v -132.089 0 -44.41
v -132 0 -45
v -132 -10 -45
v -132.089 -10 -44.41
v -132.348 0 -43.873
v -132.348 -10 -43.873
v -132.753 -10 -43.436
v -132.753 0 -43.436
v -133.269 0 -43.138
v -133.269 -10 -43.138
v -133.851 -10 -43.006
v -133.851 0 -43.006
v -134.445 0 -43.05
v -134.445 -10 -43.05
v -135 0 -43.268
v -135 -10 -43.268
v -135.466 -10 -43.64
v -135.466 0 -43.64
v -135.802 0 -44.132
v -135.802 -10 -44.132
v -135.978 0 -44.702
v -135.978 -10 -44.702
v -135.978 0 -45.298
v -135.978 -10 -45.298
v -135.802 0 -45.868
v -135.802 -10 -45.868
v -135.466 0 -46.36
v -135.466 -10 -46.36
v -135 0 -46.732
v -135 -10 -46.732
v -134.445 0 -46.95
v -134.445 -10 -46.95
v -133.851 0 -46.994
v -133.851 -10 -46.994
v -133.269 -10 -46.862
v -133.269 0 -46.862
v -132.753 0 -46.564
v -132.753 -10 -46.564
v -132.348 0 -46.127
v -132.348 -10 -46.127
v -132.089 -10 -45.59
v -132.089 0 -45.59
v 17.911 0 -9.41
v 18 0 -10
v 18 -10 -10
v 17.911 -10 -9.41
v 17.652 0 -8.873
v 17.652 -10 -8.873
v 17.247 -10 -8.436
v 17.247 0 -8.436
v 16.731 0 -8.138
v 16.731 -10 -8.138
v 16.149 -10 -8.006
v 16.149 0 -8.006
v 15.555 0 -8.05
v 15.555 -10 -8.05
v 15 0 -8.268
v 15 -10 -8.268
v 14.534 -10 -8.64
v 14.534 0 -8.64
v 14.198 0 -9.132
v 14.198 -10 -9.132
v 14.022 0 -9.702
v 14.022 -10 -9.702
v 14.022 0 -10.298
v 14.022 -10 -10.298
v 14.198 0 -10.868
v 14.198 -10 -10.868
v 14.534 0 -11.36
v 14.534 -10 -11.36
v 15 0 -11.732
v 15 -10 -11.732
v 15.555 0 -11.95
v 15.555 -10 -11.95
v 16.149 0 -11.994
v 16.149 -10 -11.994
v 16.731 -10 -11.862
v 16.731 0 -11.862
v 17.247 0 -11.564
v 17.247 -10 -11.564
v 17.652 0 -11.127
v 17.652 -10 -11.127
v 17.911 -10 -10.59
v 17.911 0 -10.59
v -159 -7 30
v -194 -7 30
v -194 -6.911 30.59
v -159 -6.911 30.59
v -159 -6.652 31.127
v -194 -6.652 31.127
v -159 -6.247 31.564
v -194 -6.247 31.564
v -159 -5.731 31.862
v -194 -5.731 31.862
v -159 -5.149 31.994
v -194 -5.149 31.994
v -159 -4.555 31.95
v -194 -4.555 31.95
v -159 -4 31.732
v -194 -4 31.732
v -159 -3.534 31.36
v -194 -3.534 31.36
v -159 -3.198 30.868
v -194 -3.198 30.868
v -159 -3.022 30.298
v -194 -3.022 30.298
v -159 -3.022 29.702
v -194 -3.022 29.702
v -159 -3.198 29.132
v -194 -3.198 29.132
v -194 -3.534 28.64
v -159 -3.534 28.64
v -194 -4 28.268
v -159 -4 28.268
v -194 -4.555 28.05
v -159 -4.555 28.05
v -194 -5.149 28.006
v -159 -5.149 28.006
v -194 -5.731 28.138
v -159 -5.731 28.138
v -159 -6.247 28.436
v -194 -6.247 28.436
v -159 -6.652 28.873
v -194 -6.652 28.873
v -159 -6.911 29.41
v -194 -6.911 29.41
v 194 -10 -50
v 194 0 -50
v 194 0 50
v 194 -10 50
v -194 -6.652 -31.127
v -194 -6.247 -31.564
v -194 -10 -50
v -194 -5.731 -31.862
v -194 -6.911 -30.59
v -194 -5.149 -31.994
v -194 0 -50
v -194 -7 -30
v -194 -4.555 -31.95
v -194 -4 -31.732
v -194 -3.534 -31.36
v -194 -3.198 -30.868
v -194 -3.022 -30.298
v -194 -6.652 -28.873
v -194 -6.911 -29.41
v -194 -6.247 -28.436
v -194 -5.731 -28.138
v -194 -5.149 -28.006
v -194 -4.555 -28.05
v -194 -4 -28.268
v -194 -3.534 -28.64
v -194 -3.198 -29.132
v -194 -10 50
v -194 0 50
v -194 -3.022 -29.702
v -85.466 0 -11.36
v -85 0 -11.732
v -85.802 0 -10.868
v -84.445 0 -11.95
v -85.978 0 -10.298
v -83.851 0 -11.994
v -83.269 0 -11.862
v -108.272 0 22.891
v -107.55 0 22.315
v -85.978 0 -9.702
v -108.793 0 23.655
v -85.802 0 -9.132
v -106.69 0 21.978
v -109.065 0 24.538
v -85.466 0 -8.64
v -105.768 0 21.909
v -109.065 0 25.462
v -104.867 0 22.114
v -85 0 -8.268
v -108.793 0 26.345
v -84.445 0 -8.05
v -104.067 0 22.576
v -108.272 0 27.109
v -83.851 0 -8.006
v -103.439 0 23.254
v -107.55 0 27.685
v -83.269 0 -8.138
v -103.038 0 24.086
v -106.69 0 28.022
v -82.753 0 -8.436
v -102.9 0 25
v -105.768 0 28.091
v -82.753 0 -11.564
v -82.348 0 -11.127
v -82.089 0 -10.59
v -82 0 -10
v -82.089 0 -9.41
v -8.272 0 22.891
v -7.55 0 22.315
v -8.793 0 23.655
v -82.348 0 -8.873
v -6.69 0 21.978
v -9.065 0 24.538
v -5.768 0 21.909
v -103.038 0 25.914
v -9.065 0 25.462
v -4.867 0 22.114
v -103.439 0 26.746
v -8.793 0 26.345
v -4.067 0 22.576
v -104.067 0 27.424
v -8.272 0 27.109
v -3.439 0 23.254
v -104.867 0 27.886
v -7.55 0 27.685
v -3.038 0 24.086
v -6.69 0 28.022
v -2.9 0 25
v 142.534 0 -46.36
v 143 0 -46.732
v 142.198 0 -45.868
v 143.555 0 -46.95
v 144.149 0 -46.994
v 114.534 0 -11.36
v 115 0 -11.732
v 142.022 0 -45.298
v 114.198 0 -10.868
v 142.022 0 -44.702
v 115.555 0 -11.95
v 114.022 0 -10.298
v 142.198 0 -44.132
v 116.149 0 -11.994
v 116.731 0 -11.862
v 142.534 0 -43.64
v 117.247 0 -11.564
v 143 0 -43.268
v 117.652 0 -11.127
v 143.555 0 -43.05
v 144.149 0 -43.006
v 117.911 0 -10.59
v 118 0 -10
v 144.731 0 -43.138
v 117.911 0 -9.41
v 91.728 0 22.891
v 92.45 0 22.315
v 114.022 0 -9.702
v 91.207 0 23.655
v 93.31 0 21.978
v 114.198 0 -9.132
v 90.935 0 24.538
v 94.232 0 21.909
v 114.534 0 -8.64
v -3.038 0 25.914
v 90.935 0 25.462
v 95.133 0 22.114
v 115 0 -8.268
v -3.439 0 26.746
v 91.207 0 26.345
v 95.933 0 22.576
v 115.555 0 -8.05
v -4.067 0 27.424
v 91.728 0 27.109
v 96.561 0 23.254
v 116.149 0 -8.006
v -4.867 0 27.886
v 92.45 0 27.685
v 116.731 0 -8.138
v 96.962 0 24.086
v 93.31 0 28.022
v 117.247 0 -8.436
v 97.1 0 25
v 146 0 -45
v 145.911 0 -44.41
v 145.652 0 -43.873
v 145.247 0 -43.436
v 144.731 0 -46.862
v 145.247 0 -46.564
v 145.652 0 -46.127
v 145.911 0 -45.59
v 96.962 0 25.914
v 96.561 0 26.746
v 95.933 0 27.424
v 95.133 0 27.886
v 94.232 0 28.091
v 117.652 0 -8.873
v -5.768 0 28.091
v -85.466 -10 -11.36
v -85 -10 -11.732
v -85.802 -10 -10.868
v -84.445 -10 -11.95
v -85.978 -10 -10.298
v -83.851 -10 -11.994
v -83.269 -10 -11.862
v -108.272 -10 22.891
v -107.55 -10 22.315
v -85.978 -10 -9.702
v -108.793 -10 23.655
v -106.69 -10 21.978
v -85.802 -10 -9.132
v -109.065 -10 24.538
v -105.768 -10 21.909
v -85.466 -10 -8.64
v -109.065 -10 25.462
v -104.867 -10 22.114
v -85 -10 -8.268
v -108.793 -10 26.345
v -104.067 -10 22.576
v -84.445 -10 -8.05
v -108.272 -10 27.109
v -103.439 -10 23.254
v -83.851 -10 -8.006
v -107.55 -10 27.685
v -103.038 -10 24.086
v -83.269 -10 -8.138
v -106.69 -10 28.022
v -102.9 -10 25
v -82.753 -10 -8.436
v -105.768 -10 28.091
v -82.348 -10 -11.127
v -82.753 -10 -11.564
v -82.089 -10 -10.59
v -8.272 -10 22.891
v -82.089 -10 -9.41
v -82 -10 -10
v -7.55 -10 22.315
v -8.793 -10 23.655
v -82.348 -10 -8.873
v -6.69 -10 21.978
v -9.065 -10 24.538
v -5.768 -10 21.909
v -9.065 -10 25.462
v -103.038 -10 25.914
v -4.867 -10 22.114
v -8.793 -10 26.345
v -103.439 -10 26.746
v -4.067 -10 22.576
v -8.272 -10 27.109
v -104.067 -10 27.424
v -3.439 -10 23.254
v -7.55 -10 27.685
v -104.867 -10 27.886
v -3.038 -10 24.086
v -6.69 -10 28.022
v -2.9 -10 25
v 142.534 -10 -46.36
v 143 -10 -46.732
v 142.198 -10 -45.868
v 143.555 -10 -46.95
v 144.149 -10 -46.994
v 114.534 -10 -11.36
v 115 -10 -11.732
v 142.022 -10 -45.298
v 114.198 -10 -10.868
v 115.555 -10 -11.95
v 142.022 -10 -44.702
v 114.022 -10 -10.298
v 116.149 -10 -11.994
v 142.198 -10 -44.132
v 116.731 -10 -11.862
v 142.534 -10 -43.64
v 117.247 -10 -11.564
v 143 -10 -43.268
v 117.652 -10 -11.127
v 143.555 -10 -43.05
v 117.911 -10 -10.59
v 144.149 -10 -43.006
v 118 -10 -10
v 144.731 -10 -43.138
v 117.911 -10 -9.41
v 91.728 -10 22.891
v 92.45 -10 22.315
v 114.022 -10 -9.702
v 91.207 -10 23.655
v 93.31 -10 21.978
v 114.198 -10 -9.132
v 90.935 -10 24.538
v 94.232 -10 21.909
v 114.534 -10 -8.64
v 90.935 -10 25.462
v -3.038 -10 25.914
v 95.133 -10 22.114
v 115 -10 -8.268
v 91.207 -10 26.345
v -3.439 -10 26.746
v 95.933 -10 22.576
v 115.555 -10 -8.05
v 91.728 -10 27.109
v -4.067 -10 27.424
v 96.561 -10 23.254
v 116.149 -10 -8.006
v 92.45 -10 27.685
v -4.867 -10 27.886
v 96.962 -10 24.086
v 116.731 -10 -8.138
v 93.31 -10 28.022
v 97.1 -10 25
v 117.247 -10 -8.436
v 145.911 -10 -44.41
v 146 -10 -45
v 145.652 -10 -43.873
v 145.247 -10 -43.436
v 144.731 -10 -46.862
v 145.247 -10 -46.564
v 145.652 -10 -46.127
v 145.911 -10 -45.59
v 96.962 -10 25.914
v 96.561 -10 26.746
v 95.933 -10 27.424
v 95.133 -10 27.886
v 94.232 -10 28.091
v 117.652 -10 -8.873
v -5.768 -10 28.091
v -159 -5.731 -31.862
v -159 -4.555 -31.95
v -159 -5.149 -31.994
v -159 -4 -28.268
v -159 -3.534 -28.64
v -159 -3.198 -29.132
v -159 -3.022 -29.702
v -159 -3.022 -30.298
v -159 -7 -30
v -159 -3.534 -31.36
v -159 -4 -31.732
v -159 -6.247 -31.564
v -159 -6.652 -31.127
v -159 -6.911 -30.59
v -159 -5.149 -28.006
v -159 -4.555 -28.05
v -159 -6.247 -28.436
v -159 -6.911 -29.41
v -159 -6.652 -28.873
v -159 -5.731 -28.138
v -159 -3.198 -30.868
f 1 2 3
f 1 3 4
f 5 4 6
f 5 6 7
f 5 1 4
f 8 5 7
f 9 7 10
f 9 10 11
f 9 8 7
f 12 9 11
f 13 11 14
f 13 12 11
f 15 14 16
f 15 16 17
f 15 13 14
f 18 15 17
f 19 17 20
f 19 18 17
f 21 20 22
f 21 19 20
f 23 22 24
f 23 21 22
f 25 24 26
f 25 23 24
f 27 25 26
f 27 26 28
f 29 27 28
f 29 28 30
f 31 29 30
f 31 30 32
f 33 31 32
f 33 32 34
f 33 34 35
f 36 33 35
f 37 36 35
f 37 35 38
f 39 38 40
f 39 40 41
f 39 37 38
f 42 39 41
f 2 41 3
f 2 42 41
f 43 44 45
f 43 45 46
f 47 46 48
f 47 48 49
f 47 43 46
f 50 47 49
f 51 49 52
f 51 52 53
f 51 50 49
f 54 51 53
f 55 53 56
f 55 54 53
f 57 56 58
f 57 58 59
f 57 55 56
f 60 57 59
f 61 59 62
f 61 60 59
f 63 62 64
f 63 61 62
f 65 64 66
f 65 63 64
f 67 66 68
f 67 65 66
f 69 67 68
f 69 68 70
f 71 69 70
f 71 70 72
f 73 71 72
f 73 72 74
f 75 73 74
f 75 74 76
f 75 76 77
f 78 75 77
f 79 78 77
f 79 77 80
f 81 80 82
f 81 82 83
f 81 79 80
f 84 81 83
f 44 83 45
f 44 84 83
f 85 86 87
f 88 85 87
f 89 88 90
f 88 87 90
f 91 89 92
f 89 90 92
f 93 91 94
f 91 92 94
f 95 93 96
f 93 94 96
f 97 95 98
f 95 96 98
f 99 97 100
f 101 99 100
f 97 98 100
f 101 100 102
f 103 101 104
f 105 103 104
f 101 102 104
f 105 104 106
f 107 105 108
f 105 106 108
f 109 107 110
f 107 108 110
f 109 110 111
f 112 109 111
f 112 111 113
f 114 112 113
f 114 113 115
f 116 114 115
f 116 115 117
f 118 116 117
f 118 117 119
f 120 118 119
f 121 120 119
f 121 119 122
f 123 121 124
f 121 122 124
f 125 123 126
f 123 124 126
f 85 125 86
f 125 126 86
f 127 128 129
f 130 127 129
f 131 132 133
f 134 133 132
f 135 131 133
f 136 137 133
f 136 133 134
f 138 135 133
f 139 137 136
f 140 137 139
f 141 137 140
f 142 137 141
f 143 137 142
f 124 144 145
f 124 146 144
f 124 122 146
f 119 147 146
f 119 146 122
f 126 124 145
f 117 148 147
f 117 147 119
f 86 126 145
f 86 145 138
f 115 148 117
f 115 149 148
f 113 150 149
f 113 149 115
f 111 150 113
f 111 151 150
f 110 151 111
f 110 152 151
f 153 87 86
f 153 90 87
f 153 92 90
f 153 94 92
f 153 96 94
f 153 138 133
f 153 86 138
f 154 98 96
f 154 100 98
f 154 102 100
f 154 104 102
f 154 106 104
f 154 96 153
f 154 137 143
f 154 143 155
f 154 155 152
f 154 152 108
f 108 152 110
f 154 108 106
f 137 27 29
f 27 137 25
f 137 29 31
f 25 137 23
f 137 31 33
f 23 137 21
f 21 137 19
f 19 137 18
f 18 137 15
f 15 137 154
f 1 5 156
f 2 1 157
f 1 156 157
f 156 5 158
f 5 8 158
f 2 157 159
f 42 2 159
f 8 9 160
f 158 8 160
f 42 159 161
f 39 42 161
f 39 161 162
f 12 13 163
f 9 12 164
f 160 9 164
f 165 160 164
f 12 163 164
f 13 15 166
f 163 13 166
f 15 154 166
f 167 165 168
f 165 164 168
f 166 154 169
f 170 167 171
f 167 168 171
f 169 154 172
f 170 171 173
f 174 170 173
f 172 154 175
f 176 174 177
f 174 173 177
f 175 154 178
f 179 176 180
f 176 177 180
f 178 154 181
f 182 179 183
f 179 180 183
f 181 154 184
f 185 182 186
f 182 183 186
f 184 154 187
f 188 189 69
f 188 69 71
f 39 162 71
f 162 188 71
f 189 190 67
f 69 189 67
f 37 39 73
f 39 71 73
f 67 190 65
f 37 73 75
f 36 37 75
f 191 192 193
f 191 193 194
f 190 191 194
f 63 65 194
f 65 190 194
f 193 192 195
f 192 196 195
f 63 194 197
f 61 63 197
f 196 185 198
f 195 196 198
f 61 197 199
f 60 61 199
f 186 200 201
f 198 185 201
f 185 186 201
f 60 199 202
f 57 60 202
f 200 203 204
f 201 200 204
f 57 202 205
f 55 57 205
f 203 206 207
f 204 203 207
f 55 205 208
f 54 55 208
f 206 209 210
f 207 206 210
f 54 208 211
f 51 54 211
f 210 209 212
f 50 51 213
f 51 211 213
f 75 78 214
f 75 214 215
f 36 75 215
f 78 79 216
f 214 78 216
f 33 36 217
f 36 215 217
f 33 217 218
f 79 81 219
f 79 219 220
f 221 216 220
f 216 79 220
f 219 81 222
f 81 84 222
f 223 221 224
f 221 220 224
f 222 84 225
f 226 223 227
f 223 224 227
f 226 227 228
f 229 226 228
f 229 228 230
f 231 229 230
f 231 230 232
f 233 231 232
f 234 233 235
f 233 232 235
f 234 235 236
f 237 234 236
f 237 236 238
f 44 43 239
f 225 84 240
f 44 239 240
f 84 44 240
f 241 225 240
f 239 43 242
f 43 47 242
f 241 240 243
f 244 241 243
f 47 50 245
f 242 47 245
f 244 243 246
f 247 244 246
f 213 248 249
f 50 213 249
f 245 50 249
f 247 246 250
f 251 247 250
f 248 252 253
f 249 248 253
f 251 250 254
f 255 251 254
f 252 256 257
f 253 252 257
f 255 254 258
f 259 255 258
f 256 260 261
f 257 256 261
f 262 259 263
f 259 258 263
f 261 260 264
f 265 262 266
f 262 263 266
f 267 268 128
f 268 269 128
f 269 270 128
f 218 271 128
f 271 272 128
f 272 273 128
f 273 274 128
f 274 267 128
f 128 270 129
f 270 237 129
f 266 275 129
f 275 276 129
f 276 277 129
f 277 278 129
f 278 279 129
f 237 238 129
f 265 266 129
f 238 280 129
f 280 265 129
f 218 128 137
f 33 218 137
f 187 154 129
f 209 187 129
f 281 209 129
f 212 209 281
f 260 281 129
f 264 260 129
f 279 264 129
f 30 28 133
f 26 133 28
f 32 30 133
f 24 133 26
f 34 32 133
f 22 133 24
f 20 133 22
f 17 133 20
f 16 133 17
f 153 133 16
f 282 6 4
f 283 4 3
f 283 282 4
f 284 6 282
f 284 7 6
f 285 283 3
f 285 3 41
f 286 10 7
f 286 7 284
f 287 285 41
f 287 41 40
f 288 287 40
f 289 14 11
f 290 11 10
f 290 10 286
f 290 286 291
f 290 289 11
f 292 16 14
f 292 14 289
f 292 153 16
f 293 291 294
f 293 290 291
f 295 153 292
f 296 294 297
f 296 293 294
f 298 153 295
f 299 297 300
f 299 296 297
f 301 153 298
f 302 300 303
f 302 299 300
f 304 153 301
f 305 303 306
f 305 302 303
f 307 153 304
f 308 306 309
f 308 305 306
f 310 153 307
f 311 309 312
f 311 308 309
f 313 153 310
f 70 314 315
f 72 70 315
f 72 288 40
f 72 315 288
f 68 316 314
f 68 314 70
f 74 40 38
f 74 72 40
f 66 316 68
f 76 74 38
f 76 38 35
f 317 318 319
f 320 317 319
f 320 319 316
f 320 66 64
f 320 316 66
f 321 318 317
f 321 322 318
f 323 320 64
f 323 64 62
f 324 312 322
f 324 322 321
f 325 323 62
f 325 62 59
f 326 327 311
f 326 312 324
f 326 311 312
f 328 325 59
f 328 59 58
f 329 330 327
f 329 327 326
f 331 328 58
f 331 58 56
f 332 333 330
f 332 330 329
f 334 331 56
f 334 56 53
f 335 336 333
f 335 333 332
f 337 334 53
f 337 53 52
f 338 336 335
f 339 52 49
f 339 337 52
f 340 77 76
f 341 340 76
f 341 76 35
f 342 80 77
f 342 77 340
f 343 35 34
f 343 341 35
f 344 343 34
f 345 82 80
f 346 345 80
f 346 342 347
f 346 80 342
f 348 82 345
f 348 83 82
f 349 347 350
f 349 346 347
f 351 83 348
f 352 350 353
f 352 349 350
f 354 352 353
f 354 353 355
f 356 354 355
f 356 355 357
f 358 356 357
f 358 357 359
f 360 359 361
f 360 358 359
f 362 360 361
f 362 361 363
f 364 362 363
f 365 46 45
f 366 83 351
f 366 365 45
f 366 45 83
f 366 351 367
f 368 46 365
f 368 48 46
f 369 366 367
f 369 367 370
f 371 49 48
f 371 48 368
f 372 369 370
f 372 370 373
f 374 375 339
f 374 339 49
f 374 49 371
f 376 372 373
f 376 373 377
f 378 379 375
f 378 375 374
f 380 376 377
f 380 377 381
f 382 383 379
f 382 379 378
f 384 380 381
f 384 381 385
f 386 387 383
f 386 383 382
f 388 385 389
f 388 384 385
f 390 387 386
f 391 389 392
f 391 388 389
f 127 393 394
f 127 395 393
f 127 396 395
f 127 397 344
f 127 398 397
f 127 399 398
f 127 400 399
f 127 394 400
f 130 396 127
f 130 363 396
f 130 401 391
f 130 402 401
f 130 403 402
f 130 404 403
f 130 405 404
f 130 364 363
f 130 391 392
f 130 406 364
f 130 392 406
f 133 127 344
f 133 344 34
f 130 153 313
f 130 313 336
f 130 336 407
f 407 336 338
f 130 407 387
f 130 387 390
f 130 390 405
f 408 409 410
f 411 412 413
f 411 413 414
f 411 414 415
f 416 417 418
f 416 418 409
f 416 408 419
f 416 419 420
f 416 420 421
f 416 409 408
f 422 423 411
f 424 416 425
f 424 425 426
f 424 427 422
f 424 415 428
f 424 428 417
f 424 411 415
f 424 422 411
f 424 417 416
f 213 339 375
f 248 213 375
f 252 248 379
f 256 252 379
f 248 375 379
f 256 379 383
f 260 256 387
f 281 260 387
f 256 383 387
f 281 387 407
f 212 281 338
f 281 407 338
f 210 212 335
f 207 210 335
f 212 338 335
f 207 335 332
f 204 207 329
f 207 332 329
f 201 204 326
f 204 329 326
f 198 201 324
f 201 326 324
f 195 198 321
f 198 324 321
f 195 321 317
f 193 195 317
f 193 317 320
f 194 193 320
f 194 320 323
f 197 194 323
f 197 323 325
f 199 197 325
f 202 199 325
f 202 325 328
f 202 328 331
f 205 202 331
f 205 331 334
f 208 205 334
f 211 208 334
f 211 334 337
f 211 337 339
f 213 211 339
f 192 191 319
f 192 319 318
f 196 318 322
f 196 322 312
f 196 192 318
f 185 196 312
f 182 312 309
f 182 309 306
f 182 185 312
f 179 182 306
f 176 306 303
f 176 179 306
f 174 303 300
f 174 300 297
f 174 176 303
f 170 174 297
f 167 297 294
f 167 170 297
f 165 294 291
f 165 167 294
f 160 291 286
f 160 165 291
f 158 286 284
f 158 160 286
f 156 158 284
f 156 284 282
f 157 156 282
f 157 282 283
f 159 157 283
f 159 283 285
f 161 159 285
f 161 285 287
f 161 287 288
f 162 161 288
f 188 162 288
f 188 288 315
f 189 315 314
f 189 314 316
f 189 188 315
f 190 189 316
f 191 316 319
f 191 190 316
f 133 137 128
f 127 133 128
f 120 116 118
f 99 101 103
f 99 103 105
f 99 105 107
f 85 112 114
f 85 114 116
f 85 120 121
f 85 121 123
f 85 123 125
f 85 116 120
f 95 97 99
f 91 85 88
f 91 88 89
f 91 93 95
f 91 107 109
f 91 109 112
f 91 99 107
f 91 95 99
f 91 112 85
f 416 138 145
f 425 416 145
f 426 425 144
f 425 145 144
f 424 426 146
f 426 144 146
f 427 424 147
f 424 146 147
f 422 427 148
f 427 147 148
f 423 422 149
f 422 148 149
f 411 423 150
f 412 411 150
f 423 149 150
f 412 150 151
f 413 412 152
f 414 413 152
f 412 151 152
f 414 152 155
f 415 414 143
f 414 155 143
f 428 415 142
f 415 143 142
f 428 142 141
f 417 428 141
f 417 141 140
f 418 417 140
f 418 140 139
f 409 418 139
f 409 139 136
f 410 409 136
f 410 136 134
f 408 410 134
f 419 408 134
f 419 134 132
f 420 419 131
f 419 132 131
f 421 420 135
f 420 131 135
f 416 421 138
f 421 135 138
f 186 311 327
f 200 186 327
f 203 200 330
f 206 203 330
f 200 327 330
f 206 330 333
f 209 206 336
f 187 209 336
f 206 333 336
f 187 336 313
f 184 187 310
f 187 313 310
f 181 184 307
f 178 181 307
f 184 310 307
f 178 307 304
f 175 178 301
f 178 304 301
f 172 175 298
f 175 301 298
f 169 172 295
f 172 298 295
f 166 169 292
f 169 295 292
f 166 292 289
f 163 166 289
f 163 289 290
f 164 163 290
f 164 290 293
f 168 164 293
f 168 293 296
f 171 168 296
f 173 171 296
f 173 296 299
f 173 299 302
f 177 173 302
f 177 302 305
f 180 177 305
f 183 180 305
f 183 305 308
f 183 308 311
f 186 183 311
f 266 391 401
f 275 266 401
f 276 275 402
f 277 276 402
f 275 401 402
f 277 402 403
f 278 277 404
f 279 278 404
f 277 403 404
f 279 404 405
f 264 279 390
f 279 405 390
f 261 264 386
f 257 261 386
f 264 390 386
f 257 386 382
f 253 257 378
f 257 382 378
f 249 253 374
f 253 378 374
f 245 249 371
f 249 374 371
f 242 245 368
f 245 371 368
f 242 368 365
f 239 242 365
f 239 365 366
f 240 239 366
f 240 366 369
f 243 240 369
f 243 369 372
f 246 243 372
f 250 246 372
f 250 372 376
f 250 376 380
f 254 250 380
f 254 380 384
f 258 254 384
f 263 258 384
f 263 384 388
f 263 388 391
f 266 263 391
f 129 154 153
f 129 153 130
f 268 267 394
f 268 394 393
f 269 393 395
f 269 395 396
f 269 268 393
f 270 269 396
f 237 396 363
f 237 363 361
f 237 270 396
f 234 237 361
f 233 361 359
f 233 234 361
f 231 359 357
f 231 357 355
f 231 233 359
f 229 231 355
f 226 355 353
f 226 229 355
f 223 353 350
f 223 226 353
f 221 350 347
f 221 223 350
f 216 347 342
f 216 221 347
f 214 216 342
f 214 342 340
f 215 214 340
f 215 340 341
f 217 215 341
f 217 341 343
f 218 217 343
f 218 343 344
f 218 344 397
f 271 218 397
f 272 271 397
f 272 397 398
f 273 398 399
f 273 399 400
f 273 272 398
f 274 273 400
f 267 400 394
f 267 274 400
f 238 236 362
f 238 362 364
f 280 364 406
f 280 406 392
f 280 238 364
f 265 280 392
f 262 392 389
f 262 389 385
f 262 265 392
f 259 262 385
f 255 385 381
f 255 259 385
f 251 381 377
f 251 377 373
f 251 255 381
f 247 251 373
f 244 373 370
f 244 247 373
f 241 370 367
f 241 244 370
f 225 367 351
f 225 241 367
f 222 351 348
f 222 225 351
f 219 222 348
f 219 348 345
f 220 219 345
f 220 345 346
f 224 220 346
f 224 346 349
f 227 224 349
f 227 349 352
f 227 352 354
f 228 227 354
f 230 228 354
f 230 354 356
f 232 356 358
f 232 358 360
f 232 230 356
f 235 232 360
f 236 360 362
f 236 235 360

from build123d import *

# Parameters (mm, degrees)
F0_W     = 388
F0_H     = 100
F0_R     = 2
F1_DEPTH = 10
F2_R     = 3.1
F3_DEPTH = 25
F4_R     = 2
F5_DEPTH = 35


with BuildPart() as f1:
    # F0 (on Front) → F1 (new body)
    with BuildSketch(Plane.XZ):
        Rectangle(F0_W, F0_H)
        with Locations((-134, -45)):
            Circle(F0_R, mode=Mode.SUBTRACT)
        with Locations((-84, -10)):
            Circle(F0_R, mode=Mode.SUBTRACT)
        with Locations((144, -45)):
            Circle(F0_R, mode=Mode.SUBTRACT)
        with Locations((16, -10)):
            Circle(F0_R, mode=Mode.SUBTRACT)
        with Locations((116, -10)):
            Circle(F0_R, mode=Mode.SUBTRACT)
    extrude(amount=F1_DEPTH)

    # F2 (on face) → F3 (cut)
    with BuildSketch(Plane.XZ.offset(10)):
        with Locations((-6, 25)):
            Circle(F2_R)
        with Locations((94, 25)):
            Circle(F2_R)
        with Locations((-106, 25)):
            Circle(F2_R)
    extrude(amount=-F3_DEPTH, mode=Mode.SUBTRACT)

    # F4 (on face) → F5 (cut)
    with BuildSketch(Plane(origin=(-194, 0, 0), x_dir=(0, -1, 0), z_dir=(-1, 0, 0))):
        with Locations((5, -30)):
            Circle(F4_R)
        with Locations((5, 30)):
            Circle(F4_R)
    extrude(amount=-F5_DEPTH, mode=Mode.SUBTRACT)


solid = f1.part
